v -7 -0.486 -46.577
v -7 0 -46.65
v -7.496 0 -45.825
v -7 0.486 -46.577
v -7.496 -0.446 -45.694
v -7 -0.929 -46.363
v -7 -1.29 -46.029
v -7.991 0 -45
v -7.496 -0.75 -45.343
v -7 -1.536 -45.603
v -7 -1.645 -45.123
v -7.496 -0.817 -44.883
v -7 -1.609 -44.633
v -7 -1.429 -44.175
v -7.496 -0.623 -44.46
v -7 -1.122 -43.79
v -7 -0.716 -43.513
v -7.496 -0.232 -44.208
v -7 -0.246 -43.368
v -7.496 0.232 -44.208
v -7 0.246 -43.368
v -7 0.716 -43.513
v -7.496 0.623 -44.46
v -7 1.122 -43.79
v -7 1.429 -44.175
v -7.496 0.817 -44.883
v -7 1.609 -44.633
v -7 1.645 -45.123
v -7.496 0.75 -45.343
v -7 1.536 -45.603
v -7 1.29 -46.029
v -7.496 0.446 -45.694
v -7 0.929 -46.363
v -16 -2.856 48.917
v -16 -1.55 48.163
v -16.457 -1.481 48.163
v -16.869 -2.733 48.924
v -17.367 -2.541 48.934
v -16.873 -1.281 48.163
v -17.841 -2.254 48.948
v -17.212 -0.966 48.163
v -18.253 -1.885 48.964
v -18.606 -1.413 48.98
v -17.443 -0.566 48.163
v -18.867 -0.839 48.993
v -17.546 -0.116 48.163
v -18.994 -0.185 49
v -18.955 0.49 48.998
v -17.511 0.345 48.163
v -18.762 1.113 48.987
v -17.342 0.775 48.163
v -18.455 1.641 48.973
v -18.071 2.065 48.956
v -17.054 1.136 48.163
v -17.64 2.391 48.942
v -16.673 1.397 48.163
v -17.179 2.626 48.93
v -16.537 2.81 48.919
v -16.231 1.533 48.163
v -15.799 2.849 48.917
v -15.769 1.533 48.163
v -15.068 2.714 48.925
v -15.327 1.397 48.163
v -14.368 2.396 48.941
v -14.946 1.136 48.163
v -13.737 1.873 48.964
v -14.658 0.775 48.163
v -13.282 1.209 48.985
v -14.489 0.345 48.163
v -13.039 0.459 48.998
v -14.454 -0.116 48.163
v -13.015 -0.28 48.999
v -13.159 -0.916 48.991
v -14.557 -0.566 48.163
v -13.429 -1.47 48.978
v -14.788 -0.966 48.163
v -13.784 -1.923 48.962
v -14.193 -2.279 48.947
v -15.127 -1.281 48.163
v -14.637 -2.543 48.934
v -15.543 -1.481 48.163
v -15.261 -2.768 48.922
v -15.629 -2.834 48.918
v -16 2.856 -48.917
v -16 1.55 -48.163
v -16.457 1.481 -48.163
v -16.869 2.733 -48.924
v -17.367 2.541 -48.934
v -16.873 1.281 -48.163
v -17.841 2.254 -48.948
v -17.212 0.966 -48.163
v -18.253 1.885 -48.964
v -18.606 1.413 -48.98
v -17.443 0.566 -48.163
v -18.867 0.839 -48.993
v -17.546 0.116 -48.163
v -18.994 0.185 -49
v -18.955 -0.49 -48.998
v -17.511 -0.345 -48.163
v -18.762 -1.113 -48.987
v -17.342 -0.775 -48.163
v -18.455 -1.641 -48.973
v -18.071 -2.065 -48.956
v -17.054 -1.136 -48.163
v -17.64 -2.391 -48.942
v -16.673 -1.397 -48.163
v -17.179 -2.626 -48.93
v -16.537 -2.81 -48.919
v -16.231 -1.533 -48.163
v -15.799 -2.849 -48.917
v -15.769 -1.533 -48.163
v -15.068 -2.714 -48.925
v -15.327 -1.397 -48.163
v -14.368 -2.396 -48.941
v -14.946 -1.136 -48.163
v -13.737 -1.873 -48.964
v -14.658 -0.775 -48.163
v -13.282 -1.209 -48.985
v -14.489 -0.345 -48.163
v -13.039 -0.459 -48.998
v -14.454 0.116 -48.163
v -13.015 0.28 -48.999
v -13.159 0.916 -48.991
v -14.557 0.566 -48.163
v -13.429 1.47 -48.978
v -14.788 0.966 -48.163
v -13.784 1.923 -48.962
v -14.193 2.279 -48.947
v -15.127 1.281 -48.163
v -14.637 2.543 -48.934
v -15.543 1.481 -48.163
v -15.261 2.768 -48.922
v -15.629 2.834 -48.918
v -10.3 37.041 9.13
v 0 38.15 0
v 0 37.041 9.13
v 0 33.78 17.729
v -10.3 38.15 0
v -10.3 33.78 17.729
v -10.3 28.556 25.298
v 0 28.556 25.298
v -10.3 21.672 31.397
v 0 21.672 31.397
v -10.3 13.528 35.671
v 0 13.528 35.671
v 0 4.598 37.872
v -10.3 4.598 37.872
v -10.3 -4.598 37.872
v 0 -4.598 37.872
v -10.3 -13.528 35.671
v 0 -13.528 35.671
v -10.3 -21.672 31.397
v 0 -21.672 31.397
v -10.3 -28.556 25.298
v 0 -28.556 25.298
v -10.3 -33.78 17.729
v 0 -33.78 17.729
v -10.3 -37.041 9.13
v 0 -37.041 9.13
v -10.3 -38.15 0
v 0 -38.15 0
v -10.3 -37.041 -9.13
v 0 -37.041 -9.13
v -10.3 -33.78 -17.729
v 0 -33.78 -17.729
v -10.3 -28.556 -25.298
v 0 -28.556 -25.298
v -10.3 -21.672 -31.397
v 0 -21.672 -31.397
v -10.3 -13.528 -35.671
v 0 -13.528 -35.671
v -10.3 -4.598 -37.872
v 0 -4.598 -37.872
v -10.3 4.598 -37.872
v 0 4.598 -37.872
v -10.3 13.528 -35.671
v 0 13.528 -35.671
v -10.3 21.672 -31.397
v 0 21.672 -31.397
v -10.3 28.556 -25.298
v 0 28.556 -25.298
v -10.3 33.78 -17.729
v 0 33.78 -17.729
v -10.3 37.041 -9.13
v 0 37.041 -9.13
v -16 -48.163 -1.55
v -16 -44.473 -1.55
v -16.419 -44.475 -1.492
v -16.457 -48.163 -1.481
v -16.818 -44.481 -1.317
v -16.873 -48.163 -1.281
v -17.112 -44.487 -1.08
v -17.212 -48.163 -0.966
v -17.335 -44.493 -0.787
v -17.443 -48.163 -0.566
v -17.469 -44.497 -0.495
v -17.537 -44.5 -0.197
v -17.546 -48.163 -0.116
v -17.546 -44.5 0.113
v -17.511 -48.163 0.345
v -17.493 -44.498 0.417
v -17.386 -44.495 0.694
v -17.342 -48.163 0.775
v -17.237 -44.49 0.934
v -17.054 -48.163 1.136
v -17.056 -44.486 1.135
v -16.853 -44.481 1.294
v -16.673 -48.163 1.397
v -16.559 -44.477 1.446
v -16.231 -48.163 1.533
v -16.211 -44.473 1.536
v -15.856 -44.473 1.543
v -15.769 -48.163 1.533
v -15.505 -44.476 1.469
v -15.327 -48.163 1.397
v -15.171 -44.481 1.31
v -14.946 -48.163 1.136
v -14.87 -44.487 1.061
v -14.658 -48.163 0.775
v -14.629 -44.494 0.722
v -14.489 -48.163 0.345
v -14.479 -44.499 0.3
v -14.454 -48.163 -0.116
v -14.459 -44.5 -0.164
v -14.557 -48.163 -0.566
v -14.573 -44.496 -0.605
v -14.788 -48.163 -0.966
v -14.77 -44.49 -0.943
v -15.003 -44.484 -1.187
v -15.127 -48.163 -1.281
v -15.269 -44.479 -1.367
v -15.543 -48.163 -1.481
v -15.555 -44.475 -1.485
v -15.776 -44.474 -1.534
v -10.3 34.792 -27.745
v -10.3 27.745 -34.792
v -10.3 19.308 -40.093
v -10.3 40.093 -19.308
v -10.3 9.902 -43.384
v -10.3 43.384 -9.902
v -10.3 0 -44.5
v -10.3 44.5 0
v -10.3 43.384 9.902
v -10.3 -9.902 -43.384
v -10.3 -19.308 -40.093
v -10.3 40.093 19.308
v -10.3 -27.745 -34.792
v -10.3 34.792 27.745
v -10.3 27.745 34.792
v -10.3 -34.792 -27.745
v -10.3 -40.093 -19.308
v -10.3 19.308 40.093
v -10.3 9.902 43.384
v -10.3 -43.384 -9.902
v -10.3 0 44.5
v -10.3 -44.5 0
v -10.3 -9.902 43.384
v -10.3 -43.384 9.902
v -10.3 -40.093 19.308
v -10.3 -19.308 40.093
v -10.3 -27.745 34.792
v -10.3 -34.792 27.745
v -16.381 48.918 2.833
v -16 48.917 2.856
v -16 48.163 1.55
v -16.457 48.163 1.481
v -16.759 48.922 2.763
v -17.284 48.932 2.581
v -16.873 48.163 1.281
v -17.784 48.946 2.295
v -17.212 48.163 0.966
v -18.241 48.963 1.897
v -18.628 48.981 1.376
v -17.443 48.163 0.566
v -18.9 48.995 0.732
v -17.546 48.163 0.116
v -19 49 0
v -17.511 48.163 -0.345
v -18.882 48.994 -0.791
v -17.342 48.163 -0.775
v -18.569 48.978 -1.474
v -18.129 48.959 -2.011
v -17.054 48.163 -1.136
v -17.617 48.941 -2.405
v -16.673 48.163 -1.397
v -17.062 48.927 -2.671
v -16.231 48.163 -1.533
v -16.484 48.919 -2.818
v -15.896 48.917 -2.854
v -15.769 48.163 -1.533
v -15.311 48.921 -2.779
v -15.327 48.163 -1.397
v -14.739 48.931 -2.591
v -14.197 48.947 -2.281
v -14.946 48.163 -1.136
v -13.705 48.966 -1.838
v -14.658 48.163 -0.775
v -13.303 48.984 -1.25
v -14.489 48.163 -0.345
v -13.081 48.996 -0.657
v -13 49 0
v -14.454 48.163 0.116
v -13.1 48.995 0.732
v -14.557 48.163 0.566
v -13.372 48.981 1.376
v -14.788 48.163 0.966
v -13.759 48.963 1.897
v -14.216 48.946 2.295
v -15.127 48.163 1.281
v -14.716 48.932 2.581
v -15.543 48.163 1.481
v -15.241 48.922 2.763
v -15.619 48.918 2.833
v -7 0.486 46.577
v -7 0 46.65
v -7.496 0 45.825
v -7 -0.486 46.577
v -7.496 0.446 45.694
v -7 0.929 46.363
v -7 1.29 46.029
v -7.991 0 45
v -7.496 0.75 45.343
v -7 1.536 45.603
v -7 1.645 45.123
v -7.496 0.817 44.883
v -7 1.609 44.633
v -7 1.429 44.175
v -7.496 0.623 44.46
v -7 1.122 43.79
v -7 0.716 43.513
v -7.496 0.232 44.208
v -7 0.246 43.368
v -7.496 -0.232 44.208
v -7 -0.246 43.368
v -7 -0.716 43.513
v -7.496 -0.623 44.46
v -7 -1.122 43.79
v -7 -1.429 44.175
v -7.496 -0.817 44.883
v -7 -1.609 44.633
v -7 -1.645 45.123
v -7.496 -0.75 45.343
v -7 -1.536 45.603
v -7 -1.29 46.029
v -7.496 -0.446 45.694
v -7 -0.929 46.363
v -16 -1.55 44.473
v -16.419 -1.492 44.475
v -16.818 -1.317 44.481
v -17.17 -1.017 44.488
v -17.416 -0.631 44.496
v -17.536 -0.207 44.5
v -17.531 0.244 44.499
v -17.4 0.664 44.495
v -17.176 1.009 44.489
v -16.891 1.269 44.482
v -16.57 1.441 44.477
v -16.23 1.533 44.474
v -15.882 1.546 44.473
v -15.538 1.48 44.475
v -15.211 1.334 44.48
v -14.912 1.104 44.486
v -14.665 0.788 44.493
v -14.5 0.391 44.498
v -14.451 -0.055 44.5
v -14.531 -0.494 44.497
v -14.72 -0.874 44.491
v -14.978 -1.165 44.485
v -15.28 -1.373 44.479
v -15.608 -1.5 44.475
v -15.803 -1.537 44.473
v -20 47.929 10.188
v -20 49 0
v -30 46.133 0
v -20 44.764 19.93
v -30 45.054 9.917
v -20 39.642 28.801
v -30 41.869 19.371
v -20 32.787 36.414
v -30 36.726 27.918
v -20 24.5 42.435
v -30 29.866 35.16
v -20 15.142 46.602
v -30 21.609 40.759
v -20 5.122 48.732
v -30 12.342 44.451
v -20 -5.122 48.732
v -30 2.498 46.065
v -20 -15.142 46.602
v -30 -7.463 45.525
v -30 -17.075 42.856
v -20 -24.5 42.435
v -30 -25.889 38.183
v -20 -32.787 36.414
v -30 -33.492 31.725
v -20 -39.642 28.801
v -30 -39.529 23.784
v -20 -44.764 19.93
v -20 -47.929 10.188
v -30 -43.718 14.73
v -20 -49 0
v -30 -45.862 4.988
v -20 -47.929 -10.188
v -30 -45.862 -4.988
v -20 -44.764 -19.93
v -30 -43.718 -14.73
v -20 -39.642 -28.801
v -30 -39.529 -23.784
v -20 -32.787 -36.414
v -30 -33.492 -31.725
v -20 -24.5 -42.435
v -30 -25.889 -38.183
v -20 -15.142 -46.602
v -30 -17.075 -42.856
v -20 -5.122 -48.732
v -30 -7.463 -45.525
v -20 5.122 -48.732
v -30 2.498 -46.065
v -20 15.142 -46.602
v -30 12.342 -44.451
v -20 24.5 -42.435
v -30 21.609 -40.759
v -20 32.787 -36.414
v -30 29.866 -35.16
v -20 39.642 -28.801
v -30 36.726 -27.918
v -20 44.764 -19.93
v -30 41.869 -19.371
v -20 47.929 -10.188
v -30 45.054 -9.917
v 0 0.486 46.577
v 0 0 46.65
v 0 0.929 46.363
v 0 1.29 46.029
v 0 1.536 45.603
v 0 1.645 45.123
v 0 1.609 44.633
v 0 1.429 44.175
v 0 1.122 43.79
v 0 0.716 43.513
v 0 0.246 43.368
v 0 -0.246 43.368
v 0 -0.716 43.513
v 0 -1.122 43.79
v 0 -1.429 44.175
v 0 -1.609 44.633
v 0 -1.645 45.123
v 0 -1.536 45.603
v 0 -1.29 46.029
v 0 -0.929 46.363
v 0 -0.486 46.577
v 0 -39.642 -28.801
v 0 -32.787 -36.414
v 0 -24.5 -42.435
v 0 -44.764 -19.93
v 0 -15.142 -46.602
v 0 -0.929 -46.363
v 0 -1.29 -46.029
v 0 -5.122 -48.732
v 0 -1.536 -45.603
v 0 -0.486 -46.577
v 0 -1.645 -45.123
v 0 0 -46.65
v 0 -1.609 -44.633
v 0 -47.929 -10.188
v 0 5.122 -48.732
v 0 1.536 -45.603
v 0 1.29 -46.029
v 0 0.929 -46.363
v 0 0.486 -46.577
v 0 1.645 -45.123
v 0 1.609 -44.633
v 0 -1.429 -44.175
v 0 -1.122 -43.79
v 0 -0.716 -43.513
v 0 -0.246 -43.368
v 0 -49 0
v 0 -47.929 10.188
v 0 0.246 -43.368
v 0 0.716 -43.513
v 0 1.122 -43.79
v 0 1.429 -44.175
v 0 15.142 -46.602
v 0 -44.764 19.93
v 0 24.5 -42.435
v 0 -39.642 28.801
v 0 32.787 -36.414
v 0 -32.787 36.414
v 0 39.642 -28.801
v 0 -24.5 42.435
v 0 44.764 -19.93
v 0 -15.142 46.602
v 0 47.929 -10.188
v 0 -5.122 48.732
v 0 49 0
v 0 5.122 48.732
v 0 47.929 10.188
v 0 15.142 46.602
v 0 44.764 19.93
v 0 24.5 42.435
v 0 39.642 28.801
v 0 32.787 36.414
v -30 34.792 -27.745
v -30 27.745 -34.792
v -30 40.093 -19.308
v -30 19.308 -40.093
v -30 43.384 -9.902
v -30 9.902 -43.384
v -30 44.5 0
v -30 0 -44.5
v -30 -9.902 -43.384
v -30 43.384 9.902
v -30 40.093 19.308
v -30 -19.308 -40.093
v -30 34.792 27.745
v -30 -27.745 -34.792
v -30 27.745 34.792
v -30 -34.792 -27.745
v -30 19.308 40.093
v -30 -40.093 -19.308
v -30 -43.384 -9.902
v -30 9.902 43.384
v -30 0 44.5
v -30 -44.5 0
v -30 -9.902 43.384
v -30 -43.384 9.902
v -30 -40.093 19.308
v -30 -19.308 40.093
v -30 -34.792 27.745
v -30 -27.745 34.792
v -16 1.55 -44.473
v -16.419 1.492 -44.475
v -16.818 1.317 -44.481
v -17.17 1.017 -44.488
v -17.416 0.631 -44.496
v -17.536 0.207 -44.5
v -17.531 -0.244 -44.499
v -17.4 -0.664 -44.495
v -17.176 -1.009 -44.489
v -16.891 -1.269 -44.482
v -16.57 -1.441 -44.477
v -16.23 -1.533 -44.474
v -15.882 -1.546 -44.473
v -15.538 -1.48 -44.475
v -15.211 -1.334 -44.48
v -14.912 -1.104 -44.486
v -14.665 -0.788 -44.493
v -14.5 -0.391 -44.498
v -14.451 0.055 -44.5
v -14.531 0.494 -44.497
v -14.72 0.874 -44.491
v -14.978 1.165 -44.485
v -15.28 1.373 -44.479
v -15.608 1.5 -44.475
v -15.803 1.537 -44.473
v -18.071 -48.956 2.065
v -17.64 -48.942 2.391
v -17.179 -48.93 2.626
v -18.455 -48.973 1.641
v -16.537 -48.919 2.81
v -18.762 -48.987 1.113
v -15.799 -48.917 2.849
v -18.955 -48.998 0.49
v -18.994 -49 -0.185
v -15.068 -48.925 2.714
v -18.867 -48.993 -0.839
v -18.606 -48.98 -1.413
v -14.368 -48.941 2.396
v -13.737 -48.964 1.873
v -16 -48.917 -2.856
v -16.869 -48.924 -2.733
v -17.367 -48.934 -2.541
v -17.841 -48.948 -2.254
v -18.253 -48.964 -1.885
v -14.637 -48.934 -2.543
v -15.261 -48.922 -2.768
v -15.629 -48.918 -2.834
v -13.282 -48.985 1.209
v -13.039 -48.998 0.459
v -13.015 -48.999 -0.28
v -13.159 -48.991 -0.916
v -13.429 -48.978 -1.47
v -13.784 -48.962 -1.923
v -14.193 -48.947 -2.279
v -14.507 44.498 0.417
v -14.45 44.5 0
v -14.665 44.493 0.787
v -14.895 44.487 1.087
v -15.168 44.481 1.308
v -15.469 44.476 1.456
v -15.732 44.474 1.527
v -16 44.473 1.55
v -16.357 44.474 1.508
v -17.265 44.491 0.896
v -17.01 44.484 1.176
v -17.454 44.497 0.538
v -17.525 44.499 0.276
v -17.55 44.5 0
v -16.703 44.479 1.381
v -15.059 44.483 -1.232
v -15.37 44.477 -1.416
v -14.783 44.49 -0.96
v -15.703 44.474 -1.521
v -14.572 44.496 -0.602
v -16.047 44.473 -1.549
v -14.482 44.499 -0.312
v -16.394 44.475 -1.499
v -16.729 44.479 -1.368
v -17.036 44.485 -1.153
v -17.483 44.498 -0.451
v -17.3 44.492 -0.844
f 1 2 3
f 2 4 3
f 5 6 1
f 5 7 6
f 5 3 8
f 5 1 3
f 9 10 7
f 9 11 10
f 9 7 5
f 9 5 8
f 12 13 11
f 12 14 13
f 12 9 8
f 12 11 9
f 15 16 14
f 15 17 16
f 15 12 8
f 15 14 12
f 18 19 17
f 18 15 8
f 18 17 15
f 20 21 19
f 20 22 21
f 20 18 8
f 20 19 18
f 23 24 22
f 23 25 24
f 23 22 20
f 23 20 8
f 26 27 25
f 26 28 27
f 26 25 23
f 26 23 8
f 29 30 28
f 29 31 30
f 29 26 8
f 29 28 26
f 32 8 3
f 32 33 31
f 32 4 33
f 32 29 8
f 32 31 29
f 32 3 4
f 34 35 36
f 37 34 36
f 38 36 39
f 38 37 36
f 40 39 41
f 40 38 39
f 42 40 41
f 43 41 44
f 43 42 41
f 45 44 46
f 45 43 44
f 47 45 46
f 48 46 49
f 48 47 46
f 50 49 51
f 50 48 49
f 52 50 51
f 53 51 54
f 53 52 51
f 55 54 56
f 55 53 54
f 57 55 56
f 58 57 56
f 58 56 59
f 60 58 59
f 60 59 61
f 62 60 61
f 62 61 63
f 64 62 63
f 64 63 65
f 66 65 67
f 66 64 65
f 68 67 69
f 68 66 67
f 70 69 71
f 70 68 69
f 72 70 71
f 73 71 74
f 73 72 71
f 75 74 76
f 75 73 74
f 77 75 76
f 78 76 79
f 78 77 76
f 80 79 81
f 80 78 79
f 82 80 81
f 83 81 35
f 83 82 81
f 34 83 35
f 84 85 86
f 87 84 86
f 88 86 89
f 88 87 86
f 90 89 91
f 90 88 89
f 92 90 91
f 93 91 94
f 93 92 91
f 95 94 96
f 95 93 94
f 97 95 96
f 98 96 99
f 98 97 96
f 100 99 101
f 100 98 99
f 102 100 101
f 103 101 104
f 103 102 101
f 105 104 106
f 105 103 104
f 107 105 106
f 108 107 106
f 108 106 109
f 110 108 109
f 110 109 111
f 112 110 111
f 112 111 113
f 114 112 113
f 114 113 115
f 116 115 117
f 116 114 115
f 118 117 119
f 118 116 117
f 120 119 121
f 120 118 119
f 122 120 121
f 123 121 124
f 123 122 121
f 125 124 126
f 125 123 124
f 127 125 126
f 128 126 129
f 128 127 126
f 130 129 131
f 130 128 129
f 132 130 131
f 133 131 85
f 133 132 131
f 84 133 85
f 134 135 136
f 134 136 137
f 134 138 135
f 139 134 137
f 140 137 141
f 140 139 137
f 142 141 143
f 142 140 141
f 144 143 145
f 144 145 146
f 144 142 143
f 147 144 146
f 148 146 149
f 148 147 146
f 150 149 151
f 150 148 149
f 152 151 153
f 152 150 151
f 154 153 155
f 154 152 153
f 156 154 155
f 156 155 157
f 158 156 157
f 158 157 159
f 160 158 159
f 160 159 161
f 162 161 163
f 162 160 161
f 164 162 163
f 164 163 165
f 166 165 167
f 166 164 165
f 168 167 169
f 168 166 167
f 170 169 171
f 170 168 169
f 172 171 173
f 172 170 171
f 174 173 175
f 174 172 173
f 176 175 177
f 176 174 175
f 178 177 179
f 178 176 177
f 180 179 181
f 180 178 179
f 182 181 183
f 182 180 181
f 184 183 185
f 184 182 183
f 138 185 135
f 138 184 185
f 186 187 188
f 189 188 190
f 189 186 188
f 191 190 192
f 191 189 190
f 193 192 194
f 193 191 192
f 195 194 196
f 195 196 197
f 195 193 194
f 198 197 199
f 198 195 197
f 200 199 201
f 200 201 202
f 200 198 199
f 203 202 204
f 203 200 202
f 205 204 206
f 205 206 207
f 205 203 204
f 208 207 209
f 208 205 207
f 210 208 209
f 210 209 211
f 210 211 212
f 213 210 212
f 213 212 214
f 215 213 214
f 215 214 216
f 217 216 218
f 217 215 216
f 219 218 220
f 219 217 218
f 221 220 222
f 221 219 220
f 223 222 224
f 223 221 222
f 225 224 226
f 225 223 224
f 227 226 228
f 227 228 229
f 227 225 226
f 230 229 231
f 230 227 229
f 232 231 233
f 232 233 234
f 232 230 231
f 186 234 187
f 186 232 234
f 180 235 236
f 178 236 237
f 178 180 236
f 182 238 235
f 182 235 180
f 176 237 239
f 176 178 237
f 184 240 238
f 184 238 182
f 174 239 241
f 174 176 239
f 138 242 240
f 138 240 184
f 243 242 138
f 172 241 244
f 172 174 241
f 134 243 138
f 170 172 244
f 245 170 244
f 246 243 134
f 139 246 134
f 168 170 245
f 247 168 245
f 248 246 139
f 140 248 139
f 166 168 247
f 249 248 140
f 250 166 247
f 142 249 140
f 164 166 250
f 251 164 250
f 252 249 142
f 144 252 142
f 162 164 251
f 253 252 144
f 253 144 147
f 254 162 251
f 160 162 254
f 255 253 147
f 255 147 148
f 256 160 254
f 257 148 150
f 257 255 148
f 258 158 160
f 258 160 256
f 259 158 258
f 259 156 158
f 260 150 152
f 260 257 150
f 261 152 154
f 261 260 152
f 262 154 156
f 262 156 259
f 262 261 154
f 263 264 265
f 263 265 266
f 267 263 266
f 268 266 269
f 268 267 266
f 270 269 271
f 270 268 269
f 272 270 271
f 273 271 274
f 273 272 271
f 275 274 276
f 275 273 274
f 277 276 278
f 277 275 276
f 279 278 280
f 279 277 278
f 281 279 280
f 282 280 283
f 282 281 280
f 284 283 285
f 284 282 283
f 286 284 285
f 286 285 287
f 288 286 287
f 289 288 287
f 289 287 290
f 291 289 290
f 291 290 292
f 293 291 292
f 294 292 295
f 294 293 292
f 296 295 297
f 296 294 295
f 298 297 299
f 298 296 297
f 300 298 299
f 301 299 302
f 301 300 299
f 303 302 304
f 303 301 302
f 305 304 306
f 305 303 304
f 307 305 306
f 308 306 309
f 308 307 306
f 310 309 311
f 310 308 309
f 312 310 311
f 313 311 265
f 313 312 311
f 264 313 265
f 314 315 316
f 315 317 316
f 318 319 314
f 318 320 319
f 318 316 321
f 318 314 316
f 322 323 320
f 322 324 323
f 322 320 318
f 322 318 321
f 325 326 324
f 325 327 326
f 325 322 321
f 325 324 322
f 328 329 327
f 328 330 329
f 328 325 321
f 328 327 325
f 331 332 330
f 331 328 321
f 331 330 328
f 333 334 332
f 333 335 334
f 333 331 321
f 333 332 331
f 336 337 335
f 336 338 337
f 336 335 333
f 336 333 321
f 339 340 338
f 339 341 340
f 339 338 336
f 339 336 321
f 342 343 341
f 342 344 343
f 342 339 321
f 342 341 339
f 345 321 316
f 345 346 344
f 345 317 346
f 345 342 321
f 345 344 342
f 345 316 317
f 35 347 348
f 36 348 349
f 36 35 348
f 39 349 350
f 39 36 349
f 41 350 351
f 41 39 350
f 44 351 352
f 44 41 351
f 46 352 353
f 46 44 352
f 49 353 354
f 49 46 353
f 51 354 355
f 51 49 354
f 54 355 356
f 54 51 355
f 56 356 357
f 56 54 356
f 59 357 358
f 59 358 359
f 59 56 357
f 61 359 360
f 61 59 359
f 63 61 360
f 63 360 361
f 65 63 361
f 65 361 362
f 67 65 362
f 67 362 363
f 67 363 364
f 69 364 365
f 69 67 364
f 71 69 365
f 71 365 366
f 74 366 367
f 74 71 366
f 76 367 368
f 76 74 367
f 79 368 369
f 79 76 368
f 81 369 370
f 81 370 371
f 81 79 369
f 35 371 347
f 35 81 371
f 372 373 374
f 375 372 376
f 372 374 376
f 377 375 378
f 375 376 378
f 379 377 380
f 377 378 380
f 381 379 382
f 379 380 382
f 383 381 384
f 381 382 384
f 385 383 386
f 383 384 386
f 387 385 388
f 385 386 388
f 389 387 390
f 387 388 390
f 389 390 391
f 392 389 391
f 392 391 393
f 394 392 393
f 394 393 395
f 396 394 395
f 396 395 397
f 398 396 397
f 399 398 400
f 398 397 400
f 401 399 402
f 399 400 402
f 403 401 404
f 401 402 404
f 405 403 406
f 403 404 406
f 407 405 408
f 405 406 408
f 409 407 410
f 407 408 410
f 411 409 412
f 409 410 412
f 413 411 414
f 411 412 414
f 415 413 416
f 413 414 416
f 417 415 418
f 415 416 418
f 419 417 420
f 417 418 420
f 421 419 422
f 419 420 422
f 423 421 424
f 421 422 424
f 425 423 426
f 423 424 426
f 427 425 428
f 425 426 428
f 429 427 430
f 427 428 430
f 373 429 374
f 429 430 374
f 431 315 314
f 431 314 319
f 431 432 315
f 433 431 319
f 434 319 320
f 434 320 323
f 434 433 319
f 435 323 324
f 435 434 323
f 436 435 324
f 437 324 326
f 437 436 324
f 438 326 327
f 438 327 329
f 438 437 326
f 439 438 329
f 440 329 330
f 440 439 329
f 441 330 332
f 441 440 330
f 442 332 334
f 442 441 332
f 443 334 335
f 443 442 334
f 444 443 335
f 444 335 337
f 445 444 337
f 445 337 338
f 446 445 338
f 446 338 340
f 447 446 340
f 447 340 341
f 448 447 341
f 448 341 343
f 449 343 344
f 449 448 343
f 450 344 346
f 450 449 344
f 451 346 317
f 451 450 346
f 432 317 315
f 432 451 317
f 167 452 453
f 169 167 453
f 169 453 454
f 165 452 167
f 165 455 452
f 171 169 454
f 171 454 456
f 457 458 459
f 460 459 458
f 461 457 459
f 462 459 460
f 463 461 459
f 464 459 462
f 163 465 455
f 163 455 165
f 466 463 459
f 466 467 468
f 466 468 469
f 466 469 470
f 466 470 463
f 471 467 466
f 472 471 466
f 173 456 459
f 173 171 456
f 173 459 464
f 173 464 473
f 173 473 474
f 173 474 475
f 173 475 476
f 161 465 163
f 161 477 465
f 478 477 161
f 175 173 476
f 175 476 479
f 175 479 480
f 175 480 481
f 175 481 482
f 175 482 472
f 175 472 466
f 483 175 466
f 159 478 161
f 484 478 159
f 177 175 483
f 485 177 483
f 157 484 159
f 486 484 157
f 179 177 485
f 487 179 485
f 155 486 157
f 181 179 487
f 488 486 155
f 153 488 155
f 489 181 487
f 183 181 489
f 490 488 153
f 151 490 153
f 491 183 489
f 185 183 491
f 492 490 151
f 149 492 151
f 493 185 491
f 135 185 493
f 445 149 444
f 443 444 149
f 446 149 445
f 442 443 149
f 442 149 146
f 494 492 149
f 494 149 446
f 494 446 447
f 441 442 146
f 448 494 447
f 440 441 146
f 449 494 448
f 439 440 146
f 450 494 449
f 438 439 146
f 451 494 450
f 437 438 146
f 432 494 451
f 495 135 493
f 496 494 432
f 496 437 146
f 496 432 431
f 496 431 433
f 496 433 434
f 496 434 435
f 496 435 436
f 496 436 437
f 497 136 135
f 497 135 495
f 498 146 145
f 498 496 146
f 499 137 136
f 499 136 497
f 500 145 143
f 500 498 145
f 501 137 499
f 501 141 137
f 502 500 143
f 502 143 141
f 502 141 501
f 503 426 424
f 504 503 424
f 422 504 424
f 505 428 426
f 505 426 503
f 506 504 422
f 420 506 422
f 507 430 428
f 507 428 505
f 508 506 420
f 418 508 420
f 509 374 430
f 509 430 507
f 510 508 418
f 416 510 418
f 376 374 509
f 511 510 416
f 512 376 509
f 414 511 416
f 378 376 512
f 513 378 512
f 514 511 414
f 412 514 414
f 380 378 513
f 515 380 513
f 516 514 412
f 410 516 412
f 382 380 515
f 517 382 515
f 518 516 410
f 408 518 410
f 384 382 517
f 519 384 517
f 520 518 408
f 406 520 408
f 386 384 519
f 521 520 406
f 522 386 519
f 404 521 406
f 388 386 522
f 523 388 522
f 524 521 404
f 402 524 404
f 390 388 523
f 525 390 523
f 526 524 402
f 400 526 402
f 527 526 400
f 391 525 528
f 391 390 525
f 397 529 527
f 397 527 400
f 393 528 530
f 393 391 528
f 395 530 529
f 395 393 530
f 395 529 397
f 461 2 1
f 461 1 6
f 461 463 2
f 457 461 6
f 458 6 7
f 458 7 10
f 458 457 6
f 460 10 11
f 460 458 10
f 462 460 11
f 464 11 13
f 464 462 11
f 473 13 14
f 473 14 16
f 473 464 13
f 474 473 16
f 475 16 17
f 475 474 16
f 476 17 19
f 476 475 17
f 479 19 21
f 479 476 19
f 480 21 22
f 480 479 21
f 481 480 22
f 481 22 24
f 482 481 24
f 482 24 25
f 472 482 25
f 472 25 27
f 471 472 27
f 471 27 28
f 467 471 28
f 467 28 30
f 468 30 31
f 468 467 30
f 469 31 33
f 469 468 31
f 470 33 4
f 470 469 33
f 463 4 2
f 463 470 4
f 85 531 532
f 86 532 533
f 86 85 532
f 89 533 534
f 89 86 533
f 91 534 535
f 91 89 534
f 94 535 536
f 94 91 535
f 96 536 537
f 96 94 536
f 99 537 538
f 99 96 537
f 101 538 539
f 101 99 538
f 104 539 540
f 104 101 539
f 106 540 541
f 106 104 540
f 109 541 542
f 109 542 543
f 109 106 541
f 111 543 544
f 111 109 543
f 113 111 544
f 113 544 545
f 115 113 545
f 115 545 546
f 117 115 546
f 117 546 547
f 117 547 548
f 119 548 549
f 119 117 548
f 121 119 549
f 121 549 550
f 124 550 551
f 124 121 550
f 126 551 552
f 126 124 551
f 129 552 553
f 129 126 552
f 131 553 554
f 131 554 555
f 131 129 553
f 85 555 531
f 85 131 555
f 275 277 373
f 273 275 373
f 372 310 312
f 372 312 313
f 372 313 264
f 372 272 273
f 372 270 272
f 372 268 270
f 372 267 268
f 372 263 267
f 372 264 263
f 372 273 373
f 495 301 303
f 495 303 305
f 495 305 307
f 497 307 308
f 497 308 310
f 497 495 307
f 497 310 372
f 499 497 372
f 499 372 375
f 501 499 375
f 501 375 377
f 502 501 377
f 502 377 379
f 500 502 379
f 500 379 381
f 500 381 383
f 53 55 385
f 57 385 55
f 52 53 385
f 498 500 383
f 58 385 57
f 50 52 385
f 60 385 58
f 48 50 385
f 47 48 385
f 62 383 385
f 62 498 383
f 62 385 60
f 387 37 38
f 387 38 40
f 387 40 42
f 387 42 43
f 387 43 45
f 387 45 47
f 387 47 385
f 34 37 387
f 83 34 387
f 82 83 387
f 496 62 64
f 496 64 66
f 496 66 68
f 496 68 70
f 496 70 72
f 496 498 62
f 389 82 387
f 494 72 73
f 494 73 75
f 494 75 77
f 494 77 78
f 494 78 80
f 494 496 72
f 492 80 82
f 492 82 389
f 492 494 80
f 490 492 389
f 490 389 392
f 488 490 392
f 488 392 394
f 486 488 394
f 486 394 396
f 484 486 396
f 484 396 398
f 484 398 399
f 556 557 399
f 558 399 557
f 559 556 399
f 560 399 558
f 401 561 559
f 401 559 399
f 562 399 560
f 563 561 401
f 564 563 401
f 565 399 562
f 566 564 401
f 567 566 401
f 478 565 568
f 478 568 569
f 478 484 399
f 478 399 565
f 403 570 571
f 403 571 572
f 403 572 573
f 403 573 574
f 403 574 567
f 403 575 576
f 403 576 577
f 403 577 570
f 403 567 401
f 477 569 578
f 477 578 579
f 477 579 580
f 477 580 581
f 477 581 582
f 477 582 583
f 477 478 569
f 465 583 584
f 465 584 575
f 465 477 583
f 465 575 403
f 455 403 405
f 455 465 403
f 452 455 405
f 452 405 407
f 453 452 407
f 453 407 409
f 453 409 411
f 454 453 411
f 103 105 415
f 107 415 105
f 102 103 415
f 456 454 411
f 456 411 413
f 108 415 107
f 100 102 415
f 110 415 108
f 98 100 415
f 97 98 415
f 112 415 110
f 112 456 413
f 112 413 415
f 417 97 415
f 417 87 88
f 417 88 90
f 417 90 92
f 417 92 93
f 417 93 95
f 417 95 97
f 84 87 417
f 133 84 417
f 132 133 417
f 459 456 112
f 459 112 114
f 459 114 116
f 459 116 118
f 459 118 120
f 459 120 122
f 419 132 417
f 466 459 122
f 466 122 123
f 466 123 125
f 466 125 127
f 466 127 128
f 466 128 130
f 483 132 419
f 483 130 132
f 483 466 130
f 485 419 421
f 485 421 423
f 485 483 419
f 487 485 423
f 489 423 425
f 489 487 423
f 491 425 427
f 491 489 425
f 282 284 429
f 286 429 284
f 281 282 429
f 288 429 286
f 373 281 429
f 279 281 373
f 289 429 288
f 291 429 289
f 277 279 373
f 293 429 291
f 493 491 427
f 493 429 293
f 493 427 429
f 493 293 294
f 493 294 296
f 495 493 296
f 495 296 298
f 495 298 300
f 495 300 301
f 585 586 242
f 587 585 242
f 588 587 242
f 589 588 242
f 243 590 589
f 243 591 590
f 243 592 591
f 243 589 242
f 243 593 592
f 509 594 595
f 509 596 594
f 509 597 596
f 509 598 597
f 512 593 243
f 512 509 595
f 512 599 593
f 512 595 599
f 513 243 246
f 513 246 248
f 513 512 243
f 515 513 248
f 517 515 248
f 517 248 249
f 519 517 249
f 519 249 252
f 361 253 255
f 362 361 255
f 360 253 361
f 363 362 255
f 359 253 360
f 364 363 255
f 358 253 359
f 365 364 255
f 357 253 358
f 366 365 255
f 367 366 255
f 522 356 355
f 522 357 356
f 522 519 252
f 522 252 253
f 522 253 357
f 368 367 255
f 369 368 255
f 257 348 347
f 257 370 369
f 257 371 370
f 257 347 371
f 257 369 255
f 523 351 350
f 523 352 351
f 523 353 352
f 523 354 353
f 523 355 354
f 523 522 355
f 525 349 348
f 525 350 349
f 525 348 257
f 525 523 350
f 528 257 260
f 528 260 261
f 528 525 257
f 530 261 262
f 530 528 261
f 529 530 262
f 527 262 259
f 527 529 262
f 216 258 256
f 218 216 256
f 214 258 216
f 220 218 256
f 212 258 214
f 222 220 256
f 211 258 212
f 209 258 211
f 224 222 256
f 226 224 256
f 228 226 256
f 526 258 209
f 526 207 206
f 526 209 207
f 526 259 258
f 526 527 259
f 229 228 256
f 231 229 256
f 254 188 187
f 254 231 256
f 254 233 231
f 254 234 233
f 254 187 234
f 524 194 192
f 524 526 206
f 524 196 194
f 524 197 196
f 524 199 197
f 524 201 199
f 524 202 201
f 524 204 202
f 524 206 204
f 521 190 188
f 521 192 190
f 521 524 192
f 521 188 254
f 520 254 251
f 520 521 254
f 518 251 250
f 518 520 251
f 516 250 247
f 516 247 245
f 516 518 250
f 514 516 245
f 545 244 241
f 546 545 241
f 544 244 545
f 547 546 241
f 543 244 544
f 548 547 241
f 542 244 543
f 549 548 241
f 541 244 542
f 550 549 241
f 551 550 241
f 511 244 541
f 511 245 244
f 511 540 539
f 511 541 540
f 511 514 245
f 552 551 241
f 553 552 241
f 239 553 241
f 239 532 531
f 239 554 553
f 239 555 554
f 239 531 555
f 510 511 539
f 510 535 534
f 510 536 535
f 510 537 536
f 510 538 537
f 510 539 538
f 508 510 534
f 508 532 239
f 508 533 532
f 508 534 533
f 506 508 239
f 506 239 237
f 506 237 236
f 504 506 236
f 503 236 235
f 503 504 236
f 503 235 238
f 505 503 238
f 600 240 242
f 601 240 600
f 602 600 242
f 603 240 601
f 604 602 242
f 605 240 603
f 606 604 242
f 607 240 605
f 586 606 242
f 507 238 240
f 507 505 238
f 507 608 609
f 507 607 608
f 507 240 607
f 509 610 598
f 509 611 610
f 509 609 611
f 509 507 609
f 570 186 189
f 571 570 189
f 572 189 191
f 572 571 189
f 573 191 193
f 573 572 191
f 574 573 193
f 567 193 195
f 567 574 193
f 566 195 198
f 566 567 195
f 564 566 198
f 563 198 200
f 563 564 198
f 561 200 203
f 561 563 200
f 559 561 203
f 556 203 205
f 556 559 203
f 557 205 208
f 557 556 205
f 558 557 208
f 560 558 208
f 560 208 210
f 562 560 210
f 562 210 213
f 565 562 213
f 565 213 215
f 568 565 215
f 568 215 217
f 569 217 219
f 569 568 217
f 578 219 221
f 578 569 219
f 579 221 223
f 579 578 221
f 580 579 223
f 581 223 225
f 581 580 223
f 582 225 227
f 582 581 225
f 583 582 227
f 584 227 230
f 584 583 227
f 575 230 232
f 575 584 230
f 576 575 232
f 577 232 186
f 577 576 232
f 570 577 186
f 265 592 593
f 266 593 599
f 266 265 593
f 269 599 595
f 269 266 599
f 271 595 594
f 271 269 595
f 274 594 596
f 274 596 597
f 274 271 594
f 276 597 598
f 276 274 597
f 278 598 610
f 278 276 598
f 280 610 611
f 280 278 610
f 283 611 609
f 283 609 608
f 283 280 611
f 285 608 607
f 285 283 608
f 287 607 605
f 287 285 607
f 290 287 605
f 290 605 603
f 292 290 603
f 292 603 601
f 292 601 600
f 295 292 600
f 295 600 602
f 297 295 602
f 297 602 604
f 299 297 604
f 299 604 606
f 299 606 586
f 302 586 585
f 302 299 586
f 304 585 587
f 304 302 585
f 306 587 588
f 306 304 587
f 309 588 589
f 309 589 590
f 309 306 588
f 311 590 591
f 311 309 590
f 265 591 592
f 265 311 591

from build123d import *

# Parameters (mm, degrees)
CHANFREIN1_SIZE              = 10
CHANFREIN1_SIZE2             = 2.867453858
R_P_TITION_CIRCULAIRE1_COUNT = 2
R_P_TITION_CIRCULAIRE2_COUNT = 4


with BuildPart() as part:
    # Esquisse1 → Révolution1 (revolve)
    with BuildSketch(Plane.XY):
        Polygon((0, 49), (0, 38.15), (-10.3, 38.15), (-10.3, 44.5), (-30, 44.5), (-30, 49), align=None)
    revolve(axis=Axis((-37.547636856, 0, 0), (1, 0, 0)))

    # Chanfrein1
    chanfrein1_edges = [part.edges().sort_by_distance(p)[0] for p in [
        (-30, -49, 0),
    ]]
    chanfrein1_side = [part.faces().sort_by_distance(p)[0] for p in [
        (-15, -49, 0),
    ]]
    chamfer(chanfrein1_edges, length=CHANFREIN1_SIZE, length2=CHANFREIN1_SIZE2, reference=chanfrein1_side[0])

    # Esquisse6 → Trou taraudé M41 (revolve, cut)
    with BuildSketch(Plane(origin=(0, 0, -45), x_dir=(0, 0, -1), z_dir=(0, 1, 0))):
        Polygon((0, 0), (0, 7.991420021), (1.65, 7), (1.65, 0), align=None)
    trou_taraud_m41 = revolve(axis=Axis((6.35, 0, -45), (-1, 0, 0)), mode=Mode.SUBTRACT)

    # Répétition circulaire1: Trou taraudé M41 ×2 about axis
    r_p_tition_circulaire1_axis = Axis((0, 0, 0), (1, 0, 0))
    for i in range(1, R_P_TITION_CIRCULAIRE1_COUNT):
        add(trou_taraud_m41.rotate(r_p_tition_circulaire1_axis, i * 360 / R_P_TITION_CIRCULAIRE1_COUNT), mode=Mode.SUBTRACT)

    # Esquisse8 → Dégagement M2.51 (revolve, cut)
    with BuildSketch(Plane(origin=(-16, 0, -49), x_dir=(0, 1, 0), z_dir=(1, 0, 0))):
        Polygon((0, 0), (0, 20.931333959), (1.55, 20), (1.55, 0.83715789), (3, 0), align=None)
    d_gagement_m2_51 = revolve(axis=Axis((-16, 0, -55.35), (0, 0, 1)), mode=Mode.SUBTRACT)

    # Répétition circulaire2: Dégagement M2.51 ×4 about axis
    r_p_tition_circulaire2_axis = Axis((0, 0, 0), (-1, 0, 0))
    for i in range(1, R_P_TITION_CIRCULAIRE2_COUNT):
        add(d_gagement_m2_51.rotate(r_p_tition_circulaire2_axis, i * 360 / R_P_TITION_CIRCULAIRE2_COUNT), mode=Mode.SUBTRACT)


solid = part.part
